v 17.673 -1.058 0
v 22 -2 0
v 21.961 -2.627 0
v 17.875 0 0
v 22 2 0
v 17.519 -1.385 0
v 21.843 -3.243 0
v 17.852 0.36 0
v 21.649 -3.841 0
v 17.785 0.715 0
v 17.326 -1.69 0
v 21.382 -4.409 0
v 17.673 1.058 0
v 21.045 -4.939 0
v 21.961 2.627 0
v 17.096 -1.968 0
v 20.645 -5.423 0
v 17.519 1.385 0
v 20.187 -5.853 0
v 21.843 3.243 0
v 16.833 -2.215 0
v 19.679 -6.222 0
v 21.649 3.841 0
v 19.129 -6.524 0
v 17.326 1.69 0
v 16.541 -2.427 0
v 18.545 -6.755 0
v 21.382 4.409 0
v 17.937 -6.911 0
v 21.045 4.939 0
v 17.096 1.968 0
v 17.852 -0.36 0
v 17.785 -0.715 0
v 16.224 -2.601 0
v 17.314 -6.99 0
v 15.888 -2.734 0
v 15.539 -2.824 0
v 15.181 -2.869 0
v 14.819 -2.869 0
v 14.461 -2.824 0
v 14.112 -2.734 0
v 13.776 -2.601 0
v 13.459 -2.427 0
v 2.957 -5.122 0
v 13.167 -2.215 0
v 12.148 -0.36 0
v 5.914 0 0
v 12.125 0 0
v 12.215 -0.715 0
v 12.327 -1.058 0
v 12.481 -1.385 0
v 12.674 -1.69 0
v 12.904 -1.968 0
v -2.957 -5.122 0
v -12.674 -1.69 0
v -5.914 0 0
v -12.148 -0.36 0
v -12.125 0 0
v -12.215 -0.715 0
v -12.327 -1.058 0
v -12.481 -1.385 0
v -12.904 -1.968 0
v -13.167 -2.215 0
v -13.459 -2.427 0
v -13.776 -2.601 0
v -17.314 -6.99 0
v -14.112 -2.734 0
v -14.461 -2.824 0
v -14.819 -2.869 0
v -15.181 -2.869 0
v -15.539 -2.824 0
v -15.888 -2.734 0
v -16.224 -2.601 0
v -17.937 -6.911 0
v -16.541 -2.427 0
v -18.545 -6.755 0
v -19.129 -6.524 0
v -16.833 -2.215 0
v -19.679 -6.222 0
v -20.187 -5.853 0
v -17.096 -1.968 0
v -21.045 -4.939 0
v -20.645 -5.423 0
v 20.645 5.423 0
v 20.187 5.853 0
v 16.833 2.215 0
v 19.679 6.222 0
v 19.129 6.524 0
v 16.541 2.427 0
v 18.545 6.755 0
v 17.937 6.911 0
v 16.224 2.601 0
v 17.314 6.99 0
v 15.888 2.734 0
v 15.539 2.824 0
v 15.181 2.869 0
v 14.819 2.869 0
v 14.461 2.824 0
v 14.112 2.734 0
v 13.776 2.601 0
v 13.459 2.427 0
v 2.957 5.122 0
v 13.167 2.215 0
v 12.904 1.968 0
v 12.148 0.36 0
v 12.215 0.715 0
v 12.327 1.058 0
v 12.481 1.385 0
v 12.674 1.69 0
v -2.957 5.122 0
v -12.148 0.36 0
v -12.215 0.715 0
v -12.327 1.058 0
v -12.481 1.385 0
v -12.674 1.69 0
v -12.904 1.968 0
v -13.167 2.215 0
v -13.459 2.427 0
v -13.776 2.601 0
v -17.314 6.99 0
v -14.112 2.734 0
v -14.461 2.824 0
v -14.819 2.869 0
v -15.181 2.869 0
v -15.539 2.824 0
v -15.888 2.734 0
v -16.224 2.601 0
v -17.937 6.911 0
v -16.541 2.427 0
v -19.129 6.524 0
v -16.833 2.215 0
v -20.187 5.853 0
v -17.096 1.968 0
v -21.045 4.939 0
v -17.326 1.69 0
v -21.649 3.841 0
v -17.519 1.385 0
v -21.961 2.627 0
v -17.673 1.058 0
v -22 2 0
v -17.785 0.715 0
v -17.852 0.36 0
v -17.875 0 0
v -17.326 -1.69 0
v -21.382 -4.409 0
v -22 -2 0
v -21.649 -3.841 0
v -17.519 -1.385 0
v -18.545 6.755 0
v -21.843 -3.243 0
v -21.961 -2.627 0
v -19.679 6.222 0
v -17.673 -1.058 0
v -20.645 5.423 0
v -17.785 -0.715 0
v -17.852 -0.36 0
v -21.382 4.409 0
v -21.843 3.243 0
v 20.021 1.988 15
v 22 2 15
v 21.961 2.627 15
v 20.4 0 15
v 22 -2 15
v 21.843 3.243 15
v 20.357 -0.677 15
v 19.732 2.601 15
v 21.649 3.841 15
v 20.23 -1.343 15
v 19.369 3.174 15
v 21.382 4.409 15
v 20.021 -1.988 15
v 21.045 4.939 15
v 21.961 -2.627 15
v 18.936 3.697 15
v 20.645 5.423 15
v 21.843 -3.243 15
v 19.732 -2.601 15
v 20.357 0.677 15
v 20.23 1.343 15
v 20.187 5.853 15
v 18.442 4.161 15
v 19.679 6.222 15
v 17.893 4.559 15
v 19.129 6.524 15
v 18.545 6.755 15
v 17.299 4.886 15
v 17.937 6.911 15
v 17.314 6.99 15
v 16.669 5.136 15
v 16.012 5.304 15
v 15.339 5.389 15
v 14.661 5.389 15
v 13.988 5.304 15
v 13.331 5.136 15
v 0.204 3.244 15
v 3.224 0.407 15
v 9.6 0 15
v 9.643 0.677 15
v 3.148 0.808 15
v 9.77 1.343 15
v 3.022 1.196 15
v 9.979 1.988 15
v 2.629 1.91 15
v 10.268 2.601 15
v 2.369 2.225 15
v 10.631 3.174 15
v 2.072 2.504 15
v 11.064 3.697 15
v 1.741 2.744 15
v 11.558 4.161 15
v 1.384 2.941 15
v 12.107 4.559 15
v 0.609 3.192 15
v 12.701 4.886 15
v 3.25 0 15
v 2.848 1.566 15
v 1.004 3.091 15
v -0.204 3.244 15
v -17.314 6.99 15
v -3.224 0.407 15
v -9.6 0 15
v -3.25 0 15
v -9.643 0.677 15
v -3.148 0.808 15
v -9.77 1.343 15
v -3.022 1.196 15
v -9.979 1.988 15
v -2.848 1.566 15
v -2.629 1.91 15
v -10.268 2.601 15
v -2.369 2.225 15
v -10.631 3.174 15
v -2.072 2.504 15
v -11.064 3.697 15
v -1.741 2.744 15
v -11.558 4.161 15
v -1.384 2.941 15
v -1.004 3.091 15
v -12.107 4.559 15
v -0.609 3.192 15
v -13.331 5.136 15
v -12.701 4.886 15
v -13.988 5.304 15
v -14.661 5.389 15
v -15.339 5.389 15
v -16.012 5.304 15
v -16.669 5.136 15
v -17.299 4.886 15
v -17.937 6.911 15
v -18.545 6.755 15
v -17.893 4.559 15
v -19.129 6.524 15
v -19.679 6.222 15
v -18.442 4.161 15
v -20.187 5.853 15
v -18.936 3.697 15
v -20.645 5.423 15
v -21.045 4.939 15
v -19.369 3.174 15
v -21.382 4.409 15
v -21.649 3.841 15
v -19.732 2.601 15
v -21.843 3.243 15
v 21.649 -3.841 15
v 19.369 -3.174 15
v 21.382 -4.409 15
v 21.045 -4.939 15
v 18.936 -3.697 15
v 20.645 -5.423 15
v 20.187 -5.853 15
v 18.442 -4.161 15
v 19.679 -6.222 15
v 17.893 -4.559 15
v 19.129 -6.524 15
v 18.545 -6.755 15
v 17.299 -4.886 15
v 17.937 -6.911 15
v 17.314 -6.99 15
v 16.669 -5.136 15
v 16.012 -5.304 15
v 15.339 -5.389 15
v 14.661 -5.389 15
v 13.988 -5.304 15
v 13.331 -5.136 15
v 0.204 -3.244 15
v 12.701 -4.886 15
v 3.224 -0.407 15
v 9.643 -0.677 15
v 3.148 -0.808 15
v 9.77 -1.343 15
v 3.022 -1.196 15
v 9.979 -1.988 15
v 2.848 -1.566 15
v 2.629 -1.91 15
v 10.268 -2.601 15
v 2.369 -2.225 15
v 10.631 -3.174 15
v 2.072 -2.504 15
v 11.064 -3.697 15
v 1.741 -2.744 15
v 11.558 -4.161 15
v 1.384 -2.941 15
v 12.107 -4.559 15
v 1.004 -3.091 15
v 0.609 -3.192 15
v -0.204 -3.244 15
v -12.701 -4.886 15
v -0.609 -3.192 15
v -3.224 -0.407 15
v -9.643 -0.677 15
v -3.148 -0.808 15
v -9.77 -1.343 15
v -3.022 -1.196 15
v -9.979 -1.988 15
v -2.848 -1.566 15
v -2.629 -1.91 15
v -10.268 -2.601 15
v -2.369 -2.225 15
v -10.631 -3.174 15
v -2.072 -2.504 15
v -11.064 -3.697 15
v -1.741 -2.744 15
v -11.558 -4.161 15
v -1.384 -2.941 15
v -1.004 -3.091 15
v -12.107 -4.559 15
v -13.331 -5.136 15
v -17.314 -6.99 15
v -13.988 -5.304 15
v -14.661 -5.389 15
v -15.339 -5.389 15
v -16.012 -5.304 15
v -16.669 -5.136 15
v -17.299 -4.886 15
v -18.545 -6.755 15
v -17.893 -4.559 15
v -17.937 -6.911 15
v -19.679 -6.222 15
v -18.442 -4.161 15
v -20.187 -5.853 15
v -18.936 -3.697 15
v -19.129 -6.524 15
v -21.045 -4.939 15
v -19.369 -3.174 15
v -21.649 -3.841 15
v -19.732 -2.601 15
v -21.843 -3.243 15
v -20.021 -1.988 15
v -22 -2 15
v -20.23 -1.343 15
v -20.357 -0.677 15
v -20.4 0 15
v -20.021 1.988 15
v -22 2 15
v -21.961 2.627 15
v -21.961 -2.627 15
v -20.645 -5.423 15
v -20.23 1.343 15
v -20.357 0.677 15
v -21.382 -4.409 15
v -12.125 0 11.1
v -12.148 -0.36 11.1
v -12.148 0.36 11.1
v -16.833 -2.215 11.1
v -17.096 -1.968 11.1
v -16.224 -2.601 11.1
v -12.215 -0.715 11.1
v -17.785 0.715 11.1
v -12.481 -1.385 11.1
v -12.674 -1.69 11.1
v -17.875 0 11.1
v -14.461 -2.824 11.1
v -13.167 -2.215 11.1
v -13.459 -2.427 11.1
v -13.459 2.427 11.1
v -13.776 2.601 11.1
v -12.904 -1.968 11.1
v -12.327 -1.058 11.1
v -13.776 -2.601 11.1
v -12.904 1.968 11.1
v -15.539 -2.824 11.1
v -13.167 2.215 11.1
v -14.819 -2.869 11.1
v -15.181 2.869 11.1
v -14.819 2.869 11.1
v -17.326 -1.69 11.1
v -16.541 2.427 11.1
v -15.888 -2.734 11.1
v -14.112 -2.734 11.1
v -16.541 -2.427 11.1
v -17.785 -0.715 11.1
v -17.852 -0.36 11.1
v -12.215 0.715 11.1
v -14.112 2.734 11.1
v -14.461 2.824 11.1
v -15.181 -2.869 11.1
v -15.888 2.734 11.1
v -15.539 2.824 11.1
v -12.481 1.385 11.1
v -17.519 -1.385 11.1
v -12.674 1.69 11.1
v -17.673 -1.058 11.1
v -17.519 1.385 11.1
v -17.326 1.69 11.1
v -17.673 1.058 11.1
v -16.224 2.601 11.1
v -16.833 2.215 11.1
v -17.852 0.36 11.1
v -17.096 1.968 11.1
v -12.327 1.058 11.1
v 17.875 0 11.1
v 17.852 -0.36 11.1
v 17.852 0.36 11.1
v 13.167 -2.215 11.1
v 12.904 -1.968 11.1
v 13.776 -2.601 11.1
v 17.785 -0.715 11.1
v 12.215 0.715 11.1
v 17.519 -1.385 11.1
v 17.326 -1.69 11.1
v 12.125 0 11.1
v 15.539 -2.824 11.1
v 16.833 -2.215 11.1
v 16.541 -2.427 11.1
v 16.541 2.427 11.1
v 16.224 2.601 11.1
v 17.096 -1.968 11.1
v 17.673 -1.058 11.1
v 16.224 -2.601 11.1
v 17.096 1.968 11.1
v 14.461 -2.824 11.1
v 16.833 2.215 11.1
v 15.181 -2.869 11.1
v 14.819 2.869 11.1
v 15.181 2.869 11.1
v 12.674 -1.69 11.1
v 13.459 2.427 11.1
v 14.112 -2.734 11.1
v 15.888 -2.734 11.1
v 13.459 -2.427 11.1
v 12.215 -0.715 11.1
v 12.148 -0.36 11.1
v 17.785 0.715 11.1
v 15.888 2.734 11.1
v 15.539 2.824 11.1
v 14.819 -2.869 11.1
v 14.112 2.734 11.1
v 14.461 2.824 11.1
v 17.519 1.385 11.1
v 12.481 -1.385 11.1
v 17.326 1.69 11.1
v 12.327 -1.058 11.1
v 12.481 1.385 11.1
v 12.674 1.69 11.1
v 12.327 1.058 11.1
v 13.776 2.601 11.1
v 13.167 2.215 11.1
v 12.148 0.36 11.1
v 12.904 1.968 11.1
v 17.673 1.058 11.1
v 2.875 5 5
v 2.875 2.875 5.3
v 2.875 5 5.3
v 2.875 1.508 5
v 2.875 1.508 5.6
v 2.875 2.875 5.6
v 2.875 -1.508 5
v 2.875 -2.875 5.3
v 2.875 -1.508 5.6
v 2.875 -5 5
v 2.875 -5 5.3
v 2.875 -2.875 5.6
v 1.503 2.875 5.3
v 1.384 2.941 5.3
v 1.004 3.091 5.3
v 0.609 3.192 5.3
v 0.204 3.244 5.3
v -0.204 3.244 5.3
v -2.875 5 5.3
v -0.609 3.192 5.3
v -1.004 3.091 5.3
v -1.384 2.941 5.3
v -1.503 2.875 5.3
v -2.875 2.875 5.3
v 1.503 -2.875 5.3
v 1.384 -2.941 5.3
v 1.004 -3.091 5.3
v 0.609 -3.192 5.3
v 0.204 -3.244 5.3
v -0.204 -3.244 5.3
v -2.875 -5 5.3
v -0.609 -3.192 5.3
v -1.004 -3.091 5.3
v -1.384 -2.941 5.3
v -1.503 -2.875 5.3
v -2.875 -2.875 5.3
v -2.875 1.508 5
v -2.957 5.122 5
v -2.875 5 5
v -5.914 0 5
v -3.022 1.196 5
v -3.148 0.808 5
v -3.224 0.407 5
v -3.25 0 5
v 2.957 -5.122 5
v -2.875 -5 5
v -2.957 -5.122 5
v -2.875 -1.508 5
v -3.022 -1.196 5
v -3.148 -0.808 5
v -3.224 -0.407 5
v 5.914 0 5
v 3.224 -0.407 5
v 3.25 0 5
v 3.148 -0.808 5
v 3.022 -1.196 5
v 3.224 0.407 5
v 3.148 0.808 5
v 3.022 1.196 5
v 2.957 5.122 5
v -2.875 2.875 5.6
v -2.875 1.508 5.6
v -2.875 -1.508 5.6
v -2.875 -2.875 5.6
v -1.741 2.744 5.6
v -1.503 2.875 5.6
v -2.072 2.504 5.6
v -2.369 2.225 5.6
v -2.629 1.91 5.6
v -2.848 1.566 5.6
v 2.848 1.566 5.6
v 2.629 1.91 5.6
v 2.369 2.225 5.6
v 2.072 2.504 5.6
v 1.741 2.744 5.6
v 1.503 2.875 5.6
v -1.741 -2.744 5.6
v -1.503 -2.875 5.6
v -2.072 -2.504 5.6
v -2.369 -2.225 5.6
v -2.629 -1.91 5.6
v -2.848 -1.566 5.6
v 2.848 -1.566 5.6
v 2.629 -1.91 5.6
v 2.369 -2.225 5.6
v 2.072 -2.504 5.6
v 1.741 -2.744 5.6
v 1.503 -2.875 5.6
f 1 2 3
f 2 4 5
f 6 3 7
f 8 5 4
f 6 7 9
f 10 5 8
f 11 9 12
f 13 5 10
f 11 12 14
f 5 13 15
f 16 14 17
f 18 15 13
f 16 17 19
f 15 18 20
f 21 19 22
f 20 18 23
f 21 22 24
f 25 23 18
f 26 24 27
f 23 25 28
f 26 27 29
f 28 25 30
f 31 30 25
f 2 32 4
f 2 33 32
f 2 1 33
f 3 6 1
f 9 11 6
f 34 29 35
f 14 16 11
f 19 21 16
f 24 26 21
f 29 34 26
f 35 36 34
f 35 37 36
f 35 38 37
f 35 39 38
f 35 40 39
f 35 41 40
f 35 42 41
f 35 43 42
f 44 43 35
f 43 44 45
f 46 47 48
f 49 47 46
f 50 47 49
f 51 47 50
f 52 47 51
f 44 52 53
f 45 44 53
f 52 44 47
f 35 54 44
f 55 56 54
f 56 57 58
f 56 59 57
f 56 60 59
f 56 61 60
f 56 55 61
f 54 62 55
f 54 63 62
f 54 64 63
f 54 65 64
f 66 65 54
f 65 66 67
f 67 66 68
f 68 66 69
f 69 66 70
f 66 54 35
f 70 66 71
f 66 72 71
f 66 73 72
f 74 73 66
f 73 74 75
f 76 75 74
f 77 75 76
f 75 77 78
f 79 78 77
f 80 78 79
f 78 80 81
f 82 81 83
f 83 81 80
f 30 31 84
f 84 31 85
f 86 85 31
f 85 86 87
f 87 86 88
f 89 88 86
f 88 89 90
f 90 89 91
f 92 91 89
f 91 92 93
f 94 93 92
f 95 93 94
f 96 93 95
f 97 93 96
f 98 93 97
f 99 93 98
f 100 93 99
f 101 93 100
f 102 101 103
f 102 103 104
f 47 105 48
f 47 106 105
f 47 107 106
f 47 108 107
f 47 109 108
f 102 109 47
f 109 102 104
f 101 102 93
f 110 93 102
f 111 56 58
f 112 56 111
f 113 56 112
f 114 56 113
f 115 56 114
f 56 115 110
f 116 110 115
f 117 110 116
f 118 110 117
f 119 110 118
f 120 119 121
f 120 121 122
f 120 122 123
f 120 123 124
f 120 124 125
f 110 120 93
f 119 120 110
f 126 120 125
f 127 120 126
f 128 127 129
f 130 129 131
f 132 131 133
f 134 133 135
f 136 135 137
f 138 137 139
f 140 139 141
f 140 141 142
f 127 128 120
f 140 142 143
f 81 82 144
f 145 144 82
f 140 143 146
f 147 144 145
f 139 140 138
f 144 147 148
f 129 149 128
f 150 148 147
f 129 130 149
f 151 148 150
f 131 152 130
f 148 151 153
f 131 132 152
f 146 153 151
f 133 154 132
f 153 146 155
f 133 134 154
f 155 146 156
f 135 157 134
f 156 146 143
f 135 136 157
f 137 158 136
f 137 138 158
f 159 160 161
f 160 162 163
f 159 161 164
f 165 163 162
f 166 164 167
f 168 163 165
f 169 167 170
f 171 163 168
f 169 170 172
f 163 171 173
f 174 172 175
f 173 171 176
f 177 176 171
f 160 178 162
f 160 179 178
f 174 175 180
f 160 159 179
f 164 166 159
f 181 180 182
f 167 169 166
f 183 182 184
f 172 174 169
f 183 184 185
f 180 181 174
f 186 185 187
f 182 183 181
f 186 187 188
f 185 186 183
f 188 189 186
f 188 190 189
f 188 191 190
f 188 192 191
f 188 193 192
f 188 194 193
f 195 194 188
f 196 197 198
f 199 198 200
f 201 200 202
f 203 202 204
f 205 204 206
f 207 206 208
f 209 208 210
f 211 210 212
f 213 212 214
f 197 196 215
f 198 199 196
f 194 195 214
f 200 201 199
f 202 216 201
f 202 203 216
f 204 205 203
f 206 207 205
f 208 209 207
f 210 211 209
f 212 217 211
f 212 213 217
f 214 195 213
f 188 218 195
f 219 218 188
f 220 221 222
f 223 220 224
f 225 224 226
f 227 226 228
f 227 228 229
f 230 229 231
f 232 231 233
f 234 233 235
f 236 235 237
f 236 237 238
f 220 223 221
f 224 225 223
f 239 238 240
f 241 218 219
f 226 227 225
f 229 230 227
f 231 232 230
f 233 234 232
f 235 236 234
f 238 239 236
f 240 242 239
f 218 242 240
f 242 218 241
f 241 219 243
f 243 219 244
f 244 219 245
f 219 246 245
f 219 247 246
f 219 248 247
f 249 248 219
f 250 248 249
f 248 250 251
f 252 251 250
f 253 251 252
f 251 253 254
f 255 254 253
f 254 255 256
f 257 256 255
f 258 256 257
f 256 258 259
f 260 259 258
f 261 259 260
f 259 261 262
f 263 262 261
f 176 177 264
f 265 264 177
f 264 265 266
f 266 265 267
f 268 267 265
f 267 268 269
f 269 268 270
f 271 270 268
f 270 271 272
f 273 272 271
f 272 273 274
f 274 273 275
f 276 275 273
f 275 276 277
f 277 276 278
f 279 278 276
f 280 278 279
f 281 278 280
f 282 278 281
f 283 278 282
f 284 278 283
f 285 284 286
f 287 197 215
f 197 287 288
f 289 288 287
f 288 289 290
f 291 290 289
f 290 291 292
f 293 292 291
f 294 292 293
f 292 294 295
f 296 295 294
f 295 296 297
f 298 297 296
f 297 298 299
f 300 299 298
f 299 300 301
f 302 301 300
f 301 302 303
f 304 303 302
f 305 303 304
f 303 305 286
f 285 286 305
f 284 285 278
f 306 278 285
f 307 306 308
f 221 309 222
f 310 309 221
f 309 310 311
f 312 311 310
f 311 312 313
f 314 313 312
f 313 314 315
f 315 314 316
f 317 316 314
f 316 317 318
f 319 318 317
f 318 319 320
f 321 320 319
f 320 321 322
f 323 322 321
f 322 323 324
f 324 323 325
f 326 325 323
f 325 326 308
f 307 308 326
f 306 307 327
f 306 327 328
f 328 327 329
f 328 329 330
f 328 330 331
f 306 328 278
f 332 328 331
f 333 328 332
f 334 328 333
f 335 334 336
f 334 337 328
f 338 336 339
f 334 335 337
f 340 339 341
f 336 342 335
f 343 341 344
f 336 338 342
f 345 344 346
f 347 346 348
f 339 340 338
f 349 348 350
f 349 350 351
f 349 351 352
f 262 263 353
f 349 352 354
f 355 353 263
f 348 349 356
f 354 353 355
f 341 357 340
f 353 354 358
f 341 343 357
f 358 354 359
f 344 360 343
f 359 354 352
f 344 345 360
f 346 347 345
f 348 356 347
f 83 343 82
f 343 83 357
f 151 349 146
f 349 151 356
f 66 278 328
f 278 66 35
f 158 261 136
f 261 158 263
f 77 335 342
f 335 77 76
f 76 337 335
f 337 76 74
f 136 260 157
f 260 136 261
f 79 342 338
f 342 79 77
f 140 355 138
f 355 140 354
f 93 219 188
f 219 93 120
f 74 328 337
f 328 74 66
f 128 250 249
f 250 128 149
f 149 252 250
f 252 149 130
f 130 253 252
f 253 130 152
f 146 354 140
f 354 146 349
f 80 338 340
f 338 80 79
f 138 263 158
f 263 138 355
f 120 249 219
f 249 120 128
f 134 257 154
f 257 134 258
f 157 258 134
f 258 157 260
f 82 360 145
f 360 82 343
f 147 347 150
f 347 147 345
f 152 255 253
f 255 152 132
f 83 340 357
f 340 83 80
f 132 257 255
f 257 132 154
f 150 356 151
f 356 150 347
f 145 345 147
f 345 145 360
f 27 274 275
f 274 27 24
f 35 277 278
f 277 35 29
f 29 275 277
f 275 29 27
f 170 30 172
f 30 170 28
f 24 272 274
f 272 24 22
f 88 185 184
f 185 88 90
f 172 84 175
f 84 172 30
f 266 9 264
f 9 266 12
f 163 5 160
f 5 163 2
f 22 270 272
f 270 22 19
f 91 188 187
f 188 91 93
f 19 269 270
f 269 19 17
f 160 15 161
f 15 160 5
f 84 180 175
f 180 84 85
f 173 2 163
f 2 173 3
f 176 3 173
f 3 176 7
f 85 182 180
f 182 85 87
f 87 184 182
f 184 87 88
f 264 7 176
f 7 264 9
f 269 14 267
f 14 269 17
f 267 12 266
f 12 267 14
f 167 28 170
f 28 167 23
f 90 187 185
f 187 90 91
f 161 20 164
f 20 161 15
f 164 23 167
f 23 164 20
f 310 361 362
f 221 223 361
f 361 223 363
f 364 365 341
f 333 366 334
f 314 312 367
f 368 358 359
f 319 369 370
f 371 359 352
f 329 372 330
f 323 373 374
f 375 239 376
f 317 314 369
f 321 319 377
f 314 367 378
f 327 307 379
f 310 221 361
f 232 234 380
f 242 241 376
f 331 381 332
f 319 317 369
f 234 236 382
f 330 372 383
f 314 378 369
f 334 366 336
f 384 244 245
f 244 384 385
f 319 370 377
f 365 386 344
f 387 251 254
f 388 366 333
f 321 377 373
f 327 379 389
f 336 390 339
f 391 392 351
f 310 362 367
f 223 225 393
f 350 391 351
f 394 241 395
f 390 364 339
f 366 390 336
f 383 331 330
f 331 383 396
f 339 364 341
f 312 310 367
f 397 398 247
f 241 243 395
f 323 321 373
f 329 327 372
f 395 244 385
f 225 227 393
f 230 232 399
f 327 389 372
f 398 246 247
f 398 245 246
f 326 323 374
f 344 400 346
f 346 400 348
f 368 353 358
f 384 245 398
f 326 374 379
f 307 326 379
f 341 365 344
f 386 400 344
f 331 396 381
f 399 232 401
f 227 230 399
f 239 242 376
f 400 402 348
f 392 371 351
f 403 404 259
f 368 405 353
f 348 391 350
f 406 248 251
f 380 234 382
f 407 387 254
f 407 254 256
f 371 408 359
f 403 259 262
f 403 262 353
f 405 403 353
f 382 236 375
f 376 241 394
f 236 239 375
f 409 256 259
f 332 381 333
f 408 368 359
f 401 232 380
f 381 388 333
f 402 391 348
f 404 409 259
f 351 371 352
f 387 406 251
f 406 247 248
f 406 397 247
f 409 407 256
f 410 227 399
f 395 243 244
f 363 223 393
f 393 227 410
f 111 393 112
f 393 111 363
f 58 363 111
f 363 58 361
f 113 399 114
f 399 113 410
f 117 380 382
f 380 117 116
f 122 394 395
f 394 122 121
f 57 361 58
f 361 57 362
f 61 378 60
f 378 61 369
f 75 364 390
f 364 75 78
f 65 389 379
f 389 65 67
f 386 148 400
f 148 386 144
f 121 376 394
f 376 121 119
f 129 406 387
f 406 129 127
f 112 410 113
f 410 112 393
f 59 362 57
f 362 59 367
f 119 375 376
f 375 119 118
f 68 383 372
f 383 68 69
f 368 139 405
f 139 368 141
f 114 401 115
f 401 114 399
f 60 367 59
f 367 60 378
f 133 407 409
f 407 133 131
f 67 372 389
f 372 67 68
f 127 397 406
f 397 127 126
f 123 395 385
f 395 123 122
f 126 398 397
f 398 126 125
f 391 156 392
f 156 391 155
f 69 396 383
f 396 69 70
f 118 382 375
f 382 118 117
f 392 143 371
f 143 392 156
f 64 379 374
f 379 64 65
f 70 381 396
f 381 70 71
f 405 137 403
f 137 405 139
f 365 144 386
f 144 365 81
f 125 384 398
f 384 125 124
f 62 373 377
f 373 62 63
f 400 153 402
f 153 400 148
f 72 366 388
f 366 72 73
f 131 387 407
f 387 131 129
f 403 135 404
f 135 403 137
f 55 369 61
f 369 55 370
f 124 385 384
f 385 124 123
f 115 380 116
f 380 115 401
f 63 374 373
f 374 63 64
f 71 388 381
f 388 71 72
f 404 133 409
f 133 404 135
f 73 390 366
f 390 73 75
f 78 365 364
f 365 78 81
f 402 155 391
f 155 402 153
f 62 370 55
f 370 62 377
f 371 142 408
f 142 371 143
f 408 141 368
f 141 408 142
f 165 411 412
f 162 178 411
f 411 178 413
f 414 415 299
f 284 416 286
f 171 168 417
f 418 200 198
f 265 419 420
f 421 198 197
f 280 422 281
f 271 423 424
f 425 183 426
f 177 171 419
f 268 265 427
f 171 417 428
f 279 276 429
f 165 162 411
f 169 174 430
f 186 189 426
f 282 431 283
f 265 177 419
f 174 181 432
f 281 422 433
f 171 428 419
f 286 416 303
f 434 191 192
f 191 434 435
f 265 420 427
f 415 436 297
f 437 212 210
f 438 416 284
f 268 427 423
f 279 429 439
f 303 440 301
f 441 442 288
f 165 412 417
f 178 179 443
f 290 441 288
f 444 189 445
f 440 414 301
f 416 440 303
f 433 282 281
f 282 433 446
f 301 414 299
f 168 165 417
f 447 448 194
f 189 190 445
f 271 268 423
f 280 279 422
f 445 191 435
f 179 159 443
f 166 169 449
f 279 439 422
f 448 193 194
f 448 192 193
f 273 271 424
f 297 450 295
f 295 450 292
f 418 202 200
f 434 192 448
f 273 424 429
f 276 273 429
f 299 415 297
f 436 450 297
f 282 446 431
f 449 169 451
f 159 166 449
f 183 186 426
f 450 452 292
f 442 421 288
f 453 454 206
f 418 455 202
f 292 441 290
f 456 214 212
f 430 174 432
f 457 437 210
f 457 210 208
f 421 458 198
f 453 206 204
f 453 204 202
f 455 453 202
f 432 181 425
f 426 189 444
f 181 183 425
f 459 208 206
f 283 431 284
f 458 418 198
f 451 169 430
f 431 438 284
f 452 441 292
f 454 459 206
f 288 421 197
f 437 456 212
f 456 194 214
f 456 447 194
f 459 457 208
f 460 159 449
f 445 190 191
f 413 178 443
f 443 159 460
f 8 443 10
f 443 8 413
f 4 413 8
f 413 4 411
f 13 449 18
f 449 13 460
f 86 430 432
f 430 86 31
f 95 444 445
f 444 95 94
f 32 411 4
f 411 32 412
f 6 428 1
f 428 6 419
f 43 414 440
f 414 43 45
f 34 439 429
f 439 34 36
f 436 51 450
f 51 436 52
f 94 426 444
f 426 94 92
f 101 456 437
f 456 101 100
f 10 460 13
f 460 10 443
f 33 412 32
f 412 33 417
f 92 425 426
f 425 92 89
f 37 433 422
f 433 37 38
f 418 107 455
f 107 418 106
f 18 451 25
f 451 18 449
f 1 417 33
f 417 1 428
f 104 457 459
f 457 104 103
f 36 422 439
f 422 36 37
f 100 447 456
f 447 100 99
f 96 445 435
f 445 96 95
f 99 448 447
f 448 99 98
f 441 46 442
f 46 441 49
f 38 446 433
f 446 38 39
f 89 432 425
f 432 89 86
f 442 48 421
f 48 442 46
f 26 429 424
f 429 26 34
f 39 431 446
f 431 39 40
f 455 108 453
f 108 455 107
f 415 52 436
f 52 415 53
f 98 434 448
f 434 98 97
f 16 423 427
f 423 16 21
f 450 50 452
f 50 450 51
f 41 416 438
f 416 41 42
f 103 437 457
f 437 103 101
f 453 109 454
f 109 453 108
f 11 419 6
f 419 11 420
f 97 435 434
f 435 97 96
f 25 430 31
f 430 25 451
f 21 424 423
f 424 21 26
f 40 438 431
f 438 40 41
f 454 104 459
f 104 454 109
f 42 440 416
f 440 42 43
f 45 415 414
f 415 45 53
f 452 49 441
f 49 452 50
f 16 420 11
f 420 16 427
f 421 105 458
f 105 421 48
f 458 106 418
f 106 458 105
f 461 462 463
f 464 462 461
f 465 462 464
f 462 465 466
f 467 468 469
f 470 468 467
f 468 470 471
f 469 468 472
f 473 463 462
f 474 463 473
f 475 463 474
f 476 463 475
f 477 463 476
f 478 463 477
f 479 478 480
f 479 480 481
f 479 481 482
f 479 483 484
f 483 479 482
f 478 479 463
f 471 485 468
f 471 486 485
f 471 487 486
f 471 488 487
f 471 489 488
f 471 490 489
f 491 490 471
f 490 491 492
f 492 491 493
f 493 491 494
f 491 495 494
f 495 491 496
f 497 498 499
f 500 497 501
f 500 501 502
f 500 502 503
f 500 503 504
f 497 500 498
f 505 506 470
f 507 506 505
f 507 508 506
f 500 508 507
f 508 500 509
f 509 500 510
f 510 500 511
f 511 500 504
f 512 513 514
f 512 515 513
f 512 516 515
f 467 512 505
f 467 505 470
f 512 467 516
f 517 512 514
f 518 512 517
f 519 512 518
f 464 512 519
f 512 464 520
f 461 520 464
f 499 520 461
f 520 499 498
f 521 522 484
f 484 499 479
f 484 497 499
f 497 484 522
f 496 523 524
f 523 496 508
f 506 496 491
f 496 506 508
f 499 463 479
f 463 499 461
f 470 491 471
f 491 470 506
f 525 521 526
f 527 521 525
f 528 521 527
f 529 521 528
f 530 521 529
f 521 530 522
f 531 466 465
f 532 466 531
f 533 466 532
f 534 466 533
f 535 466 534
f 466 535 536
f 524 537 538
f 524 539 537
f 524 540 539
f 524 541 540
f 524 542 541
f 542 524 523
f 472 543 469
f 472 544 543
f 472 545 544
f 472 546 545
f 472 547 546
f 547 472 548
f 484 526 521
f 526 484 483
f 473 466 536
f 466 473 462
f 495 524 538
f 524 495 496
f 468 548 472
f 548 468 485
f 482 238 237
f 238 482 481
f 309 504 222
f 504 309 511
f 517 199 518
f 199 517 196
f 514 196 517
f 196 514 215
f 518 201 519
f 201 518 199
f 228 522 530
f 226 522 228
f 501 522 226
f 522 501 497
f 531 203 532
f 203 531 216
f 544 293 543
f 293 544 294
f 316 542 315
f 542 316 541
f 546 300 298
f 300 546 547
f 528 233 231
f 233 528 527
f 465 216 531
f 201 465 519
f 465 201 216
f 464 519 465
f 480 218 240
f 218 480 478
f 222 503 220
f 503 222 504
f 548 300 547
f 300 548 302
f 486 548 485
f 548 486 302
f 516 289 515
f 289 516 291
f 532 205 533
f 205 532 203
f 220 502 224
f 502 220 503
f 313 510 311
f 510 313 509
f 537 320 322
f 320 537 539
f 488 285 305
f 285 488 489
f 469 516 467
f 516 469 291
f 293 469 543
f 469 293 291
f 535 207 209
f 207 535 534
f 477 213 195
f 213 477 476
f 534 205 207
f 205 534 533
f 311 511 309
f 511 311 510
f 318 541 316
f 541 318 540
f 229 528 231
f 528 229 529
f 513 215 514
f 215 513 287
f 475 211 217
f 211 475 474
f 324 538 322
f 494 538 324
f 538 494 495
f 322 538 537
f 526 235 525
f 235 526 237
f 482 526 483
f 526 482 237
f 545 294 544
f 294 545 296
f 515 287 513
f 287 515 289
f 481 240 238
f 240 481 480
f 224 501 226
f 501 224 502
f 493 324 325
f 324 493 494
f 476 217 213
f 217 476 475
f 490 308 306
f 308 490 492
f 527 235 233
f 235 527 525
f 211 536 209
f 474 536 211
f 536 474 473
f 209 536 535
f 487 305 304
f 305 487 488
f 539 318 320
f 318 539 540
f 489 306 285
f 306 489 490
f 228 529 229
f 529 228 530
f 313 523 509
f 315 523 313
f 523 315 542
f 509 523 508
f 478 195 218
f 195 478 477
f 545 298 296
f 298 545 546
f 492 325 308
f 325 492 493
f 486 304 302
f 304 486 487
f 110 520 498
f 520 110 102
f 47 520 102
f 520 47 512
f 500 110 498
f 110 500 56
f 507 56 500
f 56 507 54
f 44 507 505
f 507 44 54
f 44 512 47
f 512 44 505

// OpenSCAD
$fn = 50;


difference() {
	union() {
		cylinder(h = 15, r = 7.0000000000);
		translate(v = [-7.5000000000, 0.0000000000, 0]) {
			hull() {
				translate(v = [-9.5000000000, 2.0000000000, 0]) {
					cylinder(h = 15, r = 5);
				}
				translate(v = [9.5000000000, 2.0000000000, 0]) {
					cylinder(h = 15, r = 5);
				}
				translate(v = [-9.5000000000, -2.0000000000, 0]) {
					cylinder(h = 15, r = 5);
				}
				translate(v = [9.5000000000, -2.0000000000, 0]) {
					cylinder(h = 15, r = 5);
				}
			}
		}
		translate(v = [-7.5000000000, 0.0000000000, 0]) {
			hull() {
				translate(v = [-9.5000000000, 2.0000000000, 0]) {
					cylinder(h = 15, r = 5);
				}
				translate(v = [9.5000000000, 2.0000000000, 0]) {
					cylinder(h = 15, r = 5);
				}
				translate(v = [-9.5000000000, -2.0000000000, 0]) {
					cylinder(h = 15, r = 5);
				}
				translate(v = [9.5000000000, -2.0000000000, 0]) {
					cylinder(h = 15, r = 5);
				}
			}
		}
		translate(v = [7.5000000000, 0.0000000000, 0]) {
			hull() {
				translate(v = [-9.5000000000, 2.0000000000, 0]) {
					cylinder(h = 15, r = 5);
				}
				translate(v = [9.5000000000, 2.0000000000, 0]) {
					cylinder(h = 15, r = 5);
				}
				translate(v = [-9.5000000000, -2.0000000000, 0]) {
					cylinder(h = 15, r = 5);
				}
				translate(v = [9.5000000000, -2.0000000000, 0]) {
					cylinder(h = 15, r = 5);
				}
			}
		}
		translate(v = [7.5000000000, 0.0000000000, 0]) {
			hull() {
				translate(v = [-9.5000000000, 2.0000000000, 0]) {
					cylinder(h = 15, r = 5);
				}
				translate(v = [9.5000000000, 2.0000000000, 0]) {
					cylinder(h = 15, r = 5);
				}
				translate(v = [-9.5000000000, -2.0000000000, 0]) {
					cylinder(h = 15, r = 5);
				}
				translate(v = [9.5000000000, -2.0000000000, 0]) {
					cylinder(h = 15, r = 5);
				}
			}
		}
	}
	union() {
		translate(v = [-15.0000000000, 0.0000000000, 15]) {
			rotate(a = [0, 0, 0]) {
				difference() {
					union() {
						#translate(v = [0, 0, -15.0000000000]) {
							cylinder(h = 15, r = 2.6000000000);
						}
						#translate(v = [0, 0, -3.9000000000]) {
							cylinder(h = 3.9000000000, r1 = 2.8750000000, r2 = 5.4000000000);
						}
						#translate(v = [0, 0, -15.0000000000]) {
							cylinder(h = 15, r = 2.8750000000);
						}
						#translate(v = [0, 0, -15.0000000000]) {
							cylinder(h = 15, r = 2.6000000000);
						}
					}
					union();
				}
			}
		}
		translate(v = [-15.0000000000, 0.0000000000, 15]) {
			rotate(a = [0, 0, 0]) {
				difference() {
					union() {
						#translate(v = [0, 0, -15.0000000000]) {
							cylinder(h = 15, r = 2.6000000000);
						}
						#translate(v = [0, 0, -3.9000000000]) {
							cylinder(h = 3.9000000000, r1 = 2.8750000000, r2 = 5.4000000000);
						}
						#translate(v = [0, 0, -15.0000000000]) {
							cylinder(h = 15, r = 2.8750000000);
						}
						#translate(v = [0, 0, -15.0000000000]) {
							cylinder(h = 15, r = 2.6000000000);
						}
					}
					union();
				}
			}
		}
		translate(v = [15.0000000000, 0.0000000000, 15]) {
			rotate(a = [0, 0, 0]) {
				difference() {
					union() {
						#translate(v = [0, 0, -15.0000000000]) {
							cylinder(h = 15, r = 2.6000000000);
						}
						#translate(v = [0, 0, -3.9000000000]) {
							cylinder(h = 3.9000000000, r1 = 2.8750000000, r2 = 5.4000000000);
						}
						#translate(v = [0, 0, -15.0000000000]) {
							cylinder(h = 15, r = 2.8750000000);
						}
						#translate(v = [0, 0, -15.0000000000]) {
							cylinder(h = 15, r = 2.6000000000);
						}
					}
					union();
				}
			}
		}
		translate(v = [15.0000000000, 0.0000000000, 15]) {
			rotate(a = [0, 0, 0]) {
				difference() {
					union() {
						#translate(v = [0, 0, -15.0000000000]) {
							cylinder(h = 15, r = 2.6000000000);
						}
						#translate(v = [0, 0, -3.9000000000]) {
							cylinder(h = 3.9000000000, r1 = 2.8750000000, r2 = 5.4000000000);
						}
						#translate(v = [0, 0, -15.0000000000]) {
							cylinder(h = 15, r = 2.8750000000);
						}
						#translate(v = [0, 0, -15.0000000000]) {
							cylinder(h = 15, r = 2.6000000000);
						}
					}
					union();
				}
			}
		}
		translate(v = [0.0000000000, 0.0000000000, 0]) {
			rotate(a = [0, 0, 0]) {
				difference() {
					union() {
						#translate(v = [-2.8750000000, -5.0000000000, -0.3000000000]) {
							cube(size = [5.7500000000, 10, 0.3000000000]);
						}
						#translate(v = [-2.8750000000, -2.8750000000, -0.6000000000]) {
							cube(size = [5.7500000000, 5.7500000000, 0.3000000000]);
						}
						#translate(v = [-2.8750000000, -5.0000000000, 5]) {
							cube(size = [5.7500000000, 10, 0.3000000000]);
						}
						#translate(v = [-2.8750000000, -2.8750000000, 5.3000000000]) {
							cube(size = [5.7500000000, 5.7500000000, 0.3000000000]);
						}
						#translate(v = [0, 0, -100.0000000000]) {
							cylinder(h = 200, r = 3.2500000000);
						}
						#linear_extrude(height = 5) {
							polygon(points = [[5.9142500000, 0.0000000000], [2.9571250000, 5.1218907443], [-2.9571250000, 5.1218907443], [-5.9142500000, 0.0000000000], [-2.9571250000, -5.1218907443], [2.9571250000, -5.1218907443]]);
						}
						#translate(v = [-2.8750000000, -5.0000000000, -0.3000000000]) {
							cube(size = [5.7500000000, 10, 0.3000000000]);
						}
						#translate(v = [-2.8750000000, -2.8750000000, -0.6000000000]) {
							cube(size = [5.7500000000, 5.7500000000, 0.3000000000]);
						}
						#translate(v = [-2.8750000000, -5.0000000000, 5]) {
							cube(size = [5.7500000000, 10, 0.3000000000]);
						}
						#translate(v = [-2.8750000000, -2.8750000000, 5.3000000000]) {
							cube(size = [5.7500000000, 5.7500000000, 0.3000000000]);
						}
						#translate(v = [0, 0, -100.0000000000]) {
							cylinder(h = 200, r = 3.2500000000);
						}
						#translate(v = [-2.8750000000, -5.0000000000, -0.3000000000]) {
							cube(size = [5.7500000000, 10, 0.3000000000]);
						}
						#translate(v = [-2.8750000000, -2.8750000000, -0.6000000000]) {
							cube(size = [5.7500000000, 5.7500000000, 0.3000000000]);
						}
						#translate(v = [-2.8750000000, -5.0000000000, 5]) {
							cube(size = [5.7500000000, 10, 0.3000000000]);
						}
						#translate(v = [-2.8750000000, -2.8750000000, 5.3000000000]) {
							cube(size = [5.7500000000, 5.7500000000, 0.3000000000]);
						}
						#translate(v = [0, 0, -100.0000000000]) {
							cylinder(h = 200, r = 3.2500000000);
						}
					}
					union();
				}
			}
		}
		translate(v = [0, 0, -100]) {
			cylinder(h = 200, r = 3.2500000000);
		}
		translate(v = [0, 0, -100]) {
			cylinder(h = 200, r = 1.8000000000);
		}
	}
}
